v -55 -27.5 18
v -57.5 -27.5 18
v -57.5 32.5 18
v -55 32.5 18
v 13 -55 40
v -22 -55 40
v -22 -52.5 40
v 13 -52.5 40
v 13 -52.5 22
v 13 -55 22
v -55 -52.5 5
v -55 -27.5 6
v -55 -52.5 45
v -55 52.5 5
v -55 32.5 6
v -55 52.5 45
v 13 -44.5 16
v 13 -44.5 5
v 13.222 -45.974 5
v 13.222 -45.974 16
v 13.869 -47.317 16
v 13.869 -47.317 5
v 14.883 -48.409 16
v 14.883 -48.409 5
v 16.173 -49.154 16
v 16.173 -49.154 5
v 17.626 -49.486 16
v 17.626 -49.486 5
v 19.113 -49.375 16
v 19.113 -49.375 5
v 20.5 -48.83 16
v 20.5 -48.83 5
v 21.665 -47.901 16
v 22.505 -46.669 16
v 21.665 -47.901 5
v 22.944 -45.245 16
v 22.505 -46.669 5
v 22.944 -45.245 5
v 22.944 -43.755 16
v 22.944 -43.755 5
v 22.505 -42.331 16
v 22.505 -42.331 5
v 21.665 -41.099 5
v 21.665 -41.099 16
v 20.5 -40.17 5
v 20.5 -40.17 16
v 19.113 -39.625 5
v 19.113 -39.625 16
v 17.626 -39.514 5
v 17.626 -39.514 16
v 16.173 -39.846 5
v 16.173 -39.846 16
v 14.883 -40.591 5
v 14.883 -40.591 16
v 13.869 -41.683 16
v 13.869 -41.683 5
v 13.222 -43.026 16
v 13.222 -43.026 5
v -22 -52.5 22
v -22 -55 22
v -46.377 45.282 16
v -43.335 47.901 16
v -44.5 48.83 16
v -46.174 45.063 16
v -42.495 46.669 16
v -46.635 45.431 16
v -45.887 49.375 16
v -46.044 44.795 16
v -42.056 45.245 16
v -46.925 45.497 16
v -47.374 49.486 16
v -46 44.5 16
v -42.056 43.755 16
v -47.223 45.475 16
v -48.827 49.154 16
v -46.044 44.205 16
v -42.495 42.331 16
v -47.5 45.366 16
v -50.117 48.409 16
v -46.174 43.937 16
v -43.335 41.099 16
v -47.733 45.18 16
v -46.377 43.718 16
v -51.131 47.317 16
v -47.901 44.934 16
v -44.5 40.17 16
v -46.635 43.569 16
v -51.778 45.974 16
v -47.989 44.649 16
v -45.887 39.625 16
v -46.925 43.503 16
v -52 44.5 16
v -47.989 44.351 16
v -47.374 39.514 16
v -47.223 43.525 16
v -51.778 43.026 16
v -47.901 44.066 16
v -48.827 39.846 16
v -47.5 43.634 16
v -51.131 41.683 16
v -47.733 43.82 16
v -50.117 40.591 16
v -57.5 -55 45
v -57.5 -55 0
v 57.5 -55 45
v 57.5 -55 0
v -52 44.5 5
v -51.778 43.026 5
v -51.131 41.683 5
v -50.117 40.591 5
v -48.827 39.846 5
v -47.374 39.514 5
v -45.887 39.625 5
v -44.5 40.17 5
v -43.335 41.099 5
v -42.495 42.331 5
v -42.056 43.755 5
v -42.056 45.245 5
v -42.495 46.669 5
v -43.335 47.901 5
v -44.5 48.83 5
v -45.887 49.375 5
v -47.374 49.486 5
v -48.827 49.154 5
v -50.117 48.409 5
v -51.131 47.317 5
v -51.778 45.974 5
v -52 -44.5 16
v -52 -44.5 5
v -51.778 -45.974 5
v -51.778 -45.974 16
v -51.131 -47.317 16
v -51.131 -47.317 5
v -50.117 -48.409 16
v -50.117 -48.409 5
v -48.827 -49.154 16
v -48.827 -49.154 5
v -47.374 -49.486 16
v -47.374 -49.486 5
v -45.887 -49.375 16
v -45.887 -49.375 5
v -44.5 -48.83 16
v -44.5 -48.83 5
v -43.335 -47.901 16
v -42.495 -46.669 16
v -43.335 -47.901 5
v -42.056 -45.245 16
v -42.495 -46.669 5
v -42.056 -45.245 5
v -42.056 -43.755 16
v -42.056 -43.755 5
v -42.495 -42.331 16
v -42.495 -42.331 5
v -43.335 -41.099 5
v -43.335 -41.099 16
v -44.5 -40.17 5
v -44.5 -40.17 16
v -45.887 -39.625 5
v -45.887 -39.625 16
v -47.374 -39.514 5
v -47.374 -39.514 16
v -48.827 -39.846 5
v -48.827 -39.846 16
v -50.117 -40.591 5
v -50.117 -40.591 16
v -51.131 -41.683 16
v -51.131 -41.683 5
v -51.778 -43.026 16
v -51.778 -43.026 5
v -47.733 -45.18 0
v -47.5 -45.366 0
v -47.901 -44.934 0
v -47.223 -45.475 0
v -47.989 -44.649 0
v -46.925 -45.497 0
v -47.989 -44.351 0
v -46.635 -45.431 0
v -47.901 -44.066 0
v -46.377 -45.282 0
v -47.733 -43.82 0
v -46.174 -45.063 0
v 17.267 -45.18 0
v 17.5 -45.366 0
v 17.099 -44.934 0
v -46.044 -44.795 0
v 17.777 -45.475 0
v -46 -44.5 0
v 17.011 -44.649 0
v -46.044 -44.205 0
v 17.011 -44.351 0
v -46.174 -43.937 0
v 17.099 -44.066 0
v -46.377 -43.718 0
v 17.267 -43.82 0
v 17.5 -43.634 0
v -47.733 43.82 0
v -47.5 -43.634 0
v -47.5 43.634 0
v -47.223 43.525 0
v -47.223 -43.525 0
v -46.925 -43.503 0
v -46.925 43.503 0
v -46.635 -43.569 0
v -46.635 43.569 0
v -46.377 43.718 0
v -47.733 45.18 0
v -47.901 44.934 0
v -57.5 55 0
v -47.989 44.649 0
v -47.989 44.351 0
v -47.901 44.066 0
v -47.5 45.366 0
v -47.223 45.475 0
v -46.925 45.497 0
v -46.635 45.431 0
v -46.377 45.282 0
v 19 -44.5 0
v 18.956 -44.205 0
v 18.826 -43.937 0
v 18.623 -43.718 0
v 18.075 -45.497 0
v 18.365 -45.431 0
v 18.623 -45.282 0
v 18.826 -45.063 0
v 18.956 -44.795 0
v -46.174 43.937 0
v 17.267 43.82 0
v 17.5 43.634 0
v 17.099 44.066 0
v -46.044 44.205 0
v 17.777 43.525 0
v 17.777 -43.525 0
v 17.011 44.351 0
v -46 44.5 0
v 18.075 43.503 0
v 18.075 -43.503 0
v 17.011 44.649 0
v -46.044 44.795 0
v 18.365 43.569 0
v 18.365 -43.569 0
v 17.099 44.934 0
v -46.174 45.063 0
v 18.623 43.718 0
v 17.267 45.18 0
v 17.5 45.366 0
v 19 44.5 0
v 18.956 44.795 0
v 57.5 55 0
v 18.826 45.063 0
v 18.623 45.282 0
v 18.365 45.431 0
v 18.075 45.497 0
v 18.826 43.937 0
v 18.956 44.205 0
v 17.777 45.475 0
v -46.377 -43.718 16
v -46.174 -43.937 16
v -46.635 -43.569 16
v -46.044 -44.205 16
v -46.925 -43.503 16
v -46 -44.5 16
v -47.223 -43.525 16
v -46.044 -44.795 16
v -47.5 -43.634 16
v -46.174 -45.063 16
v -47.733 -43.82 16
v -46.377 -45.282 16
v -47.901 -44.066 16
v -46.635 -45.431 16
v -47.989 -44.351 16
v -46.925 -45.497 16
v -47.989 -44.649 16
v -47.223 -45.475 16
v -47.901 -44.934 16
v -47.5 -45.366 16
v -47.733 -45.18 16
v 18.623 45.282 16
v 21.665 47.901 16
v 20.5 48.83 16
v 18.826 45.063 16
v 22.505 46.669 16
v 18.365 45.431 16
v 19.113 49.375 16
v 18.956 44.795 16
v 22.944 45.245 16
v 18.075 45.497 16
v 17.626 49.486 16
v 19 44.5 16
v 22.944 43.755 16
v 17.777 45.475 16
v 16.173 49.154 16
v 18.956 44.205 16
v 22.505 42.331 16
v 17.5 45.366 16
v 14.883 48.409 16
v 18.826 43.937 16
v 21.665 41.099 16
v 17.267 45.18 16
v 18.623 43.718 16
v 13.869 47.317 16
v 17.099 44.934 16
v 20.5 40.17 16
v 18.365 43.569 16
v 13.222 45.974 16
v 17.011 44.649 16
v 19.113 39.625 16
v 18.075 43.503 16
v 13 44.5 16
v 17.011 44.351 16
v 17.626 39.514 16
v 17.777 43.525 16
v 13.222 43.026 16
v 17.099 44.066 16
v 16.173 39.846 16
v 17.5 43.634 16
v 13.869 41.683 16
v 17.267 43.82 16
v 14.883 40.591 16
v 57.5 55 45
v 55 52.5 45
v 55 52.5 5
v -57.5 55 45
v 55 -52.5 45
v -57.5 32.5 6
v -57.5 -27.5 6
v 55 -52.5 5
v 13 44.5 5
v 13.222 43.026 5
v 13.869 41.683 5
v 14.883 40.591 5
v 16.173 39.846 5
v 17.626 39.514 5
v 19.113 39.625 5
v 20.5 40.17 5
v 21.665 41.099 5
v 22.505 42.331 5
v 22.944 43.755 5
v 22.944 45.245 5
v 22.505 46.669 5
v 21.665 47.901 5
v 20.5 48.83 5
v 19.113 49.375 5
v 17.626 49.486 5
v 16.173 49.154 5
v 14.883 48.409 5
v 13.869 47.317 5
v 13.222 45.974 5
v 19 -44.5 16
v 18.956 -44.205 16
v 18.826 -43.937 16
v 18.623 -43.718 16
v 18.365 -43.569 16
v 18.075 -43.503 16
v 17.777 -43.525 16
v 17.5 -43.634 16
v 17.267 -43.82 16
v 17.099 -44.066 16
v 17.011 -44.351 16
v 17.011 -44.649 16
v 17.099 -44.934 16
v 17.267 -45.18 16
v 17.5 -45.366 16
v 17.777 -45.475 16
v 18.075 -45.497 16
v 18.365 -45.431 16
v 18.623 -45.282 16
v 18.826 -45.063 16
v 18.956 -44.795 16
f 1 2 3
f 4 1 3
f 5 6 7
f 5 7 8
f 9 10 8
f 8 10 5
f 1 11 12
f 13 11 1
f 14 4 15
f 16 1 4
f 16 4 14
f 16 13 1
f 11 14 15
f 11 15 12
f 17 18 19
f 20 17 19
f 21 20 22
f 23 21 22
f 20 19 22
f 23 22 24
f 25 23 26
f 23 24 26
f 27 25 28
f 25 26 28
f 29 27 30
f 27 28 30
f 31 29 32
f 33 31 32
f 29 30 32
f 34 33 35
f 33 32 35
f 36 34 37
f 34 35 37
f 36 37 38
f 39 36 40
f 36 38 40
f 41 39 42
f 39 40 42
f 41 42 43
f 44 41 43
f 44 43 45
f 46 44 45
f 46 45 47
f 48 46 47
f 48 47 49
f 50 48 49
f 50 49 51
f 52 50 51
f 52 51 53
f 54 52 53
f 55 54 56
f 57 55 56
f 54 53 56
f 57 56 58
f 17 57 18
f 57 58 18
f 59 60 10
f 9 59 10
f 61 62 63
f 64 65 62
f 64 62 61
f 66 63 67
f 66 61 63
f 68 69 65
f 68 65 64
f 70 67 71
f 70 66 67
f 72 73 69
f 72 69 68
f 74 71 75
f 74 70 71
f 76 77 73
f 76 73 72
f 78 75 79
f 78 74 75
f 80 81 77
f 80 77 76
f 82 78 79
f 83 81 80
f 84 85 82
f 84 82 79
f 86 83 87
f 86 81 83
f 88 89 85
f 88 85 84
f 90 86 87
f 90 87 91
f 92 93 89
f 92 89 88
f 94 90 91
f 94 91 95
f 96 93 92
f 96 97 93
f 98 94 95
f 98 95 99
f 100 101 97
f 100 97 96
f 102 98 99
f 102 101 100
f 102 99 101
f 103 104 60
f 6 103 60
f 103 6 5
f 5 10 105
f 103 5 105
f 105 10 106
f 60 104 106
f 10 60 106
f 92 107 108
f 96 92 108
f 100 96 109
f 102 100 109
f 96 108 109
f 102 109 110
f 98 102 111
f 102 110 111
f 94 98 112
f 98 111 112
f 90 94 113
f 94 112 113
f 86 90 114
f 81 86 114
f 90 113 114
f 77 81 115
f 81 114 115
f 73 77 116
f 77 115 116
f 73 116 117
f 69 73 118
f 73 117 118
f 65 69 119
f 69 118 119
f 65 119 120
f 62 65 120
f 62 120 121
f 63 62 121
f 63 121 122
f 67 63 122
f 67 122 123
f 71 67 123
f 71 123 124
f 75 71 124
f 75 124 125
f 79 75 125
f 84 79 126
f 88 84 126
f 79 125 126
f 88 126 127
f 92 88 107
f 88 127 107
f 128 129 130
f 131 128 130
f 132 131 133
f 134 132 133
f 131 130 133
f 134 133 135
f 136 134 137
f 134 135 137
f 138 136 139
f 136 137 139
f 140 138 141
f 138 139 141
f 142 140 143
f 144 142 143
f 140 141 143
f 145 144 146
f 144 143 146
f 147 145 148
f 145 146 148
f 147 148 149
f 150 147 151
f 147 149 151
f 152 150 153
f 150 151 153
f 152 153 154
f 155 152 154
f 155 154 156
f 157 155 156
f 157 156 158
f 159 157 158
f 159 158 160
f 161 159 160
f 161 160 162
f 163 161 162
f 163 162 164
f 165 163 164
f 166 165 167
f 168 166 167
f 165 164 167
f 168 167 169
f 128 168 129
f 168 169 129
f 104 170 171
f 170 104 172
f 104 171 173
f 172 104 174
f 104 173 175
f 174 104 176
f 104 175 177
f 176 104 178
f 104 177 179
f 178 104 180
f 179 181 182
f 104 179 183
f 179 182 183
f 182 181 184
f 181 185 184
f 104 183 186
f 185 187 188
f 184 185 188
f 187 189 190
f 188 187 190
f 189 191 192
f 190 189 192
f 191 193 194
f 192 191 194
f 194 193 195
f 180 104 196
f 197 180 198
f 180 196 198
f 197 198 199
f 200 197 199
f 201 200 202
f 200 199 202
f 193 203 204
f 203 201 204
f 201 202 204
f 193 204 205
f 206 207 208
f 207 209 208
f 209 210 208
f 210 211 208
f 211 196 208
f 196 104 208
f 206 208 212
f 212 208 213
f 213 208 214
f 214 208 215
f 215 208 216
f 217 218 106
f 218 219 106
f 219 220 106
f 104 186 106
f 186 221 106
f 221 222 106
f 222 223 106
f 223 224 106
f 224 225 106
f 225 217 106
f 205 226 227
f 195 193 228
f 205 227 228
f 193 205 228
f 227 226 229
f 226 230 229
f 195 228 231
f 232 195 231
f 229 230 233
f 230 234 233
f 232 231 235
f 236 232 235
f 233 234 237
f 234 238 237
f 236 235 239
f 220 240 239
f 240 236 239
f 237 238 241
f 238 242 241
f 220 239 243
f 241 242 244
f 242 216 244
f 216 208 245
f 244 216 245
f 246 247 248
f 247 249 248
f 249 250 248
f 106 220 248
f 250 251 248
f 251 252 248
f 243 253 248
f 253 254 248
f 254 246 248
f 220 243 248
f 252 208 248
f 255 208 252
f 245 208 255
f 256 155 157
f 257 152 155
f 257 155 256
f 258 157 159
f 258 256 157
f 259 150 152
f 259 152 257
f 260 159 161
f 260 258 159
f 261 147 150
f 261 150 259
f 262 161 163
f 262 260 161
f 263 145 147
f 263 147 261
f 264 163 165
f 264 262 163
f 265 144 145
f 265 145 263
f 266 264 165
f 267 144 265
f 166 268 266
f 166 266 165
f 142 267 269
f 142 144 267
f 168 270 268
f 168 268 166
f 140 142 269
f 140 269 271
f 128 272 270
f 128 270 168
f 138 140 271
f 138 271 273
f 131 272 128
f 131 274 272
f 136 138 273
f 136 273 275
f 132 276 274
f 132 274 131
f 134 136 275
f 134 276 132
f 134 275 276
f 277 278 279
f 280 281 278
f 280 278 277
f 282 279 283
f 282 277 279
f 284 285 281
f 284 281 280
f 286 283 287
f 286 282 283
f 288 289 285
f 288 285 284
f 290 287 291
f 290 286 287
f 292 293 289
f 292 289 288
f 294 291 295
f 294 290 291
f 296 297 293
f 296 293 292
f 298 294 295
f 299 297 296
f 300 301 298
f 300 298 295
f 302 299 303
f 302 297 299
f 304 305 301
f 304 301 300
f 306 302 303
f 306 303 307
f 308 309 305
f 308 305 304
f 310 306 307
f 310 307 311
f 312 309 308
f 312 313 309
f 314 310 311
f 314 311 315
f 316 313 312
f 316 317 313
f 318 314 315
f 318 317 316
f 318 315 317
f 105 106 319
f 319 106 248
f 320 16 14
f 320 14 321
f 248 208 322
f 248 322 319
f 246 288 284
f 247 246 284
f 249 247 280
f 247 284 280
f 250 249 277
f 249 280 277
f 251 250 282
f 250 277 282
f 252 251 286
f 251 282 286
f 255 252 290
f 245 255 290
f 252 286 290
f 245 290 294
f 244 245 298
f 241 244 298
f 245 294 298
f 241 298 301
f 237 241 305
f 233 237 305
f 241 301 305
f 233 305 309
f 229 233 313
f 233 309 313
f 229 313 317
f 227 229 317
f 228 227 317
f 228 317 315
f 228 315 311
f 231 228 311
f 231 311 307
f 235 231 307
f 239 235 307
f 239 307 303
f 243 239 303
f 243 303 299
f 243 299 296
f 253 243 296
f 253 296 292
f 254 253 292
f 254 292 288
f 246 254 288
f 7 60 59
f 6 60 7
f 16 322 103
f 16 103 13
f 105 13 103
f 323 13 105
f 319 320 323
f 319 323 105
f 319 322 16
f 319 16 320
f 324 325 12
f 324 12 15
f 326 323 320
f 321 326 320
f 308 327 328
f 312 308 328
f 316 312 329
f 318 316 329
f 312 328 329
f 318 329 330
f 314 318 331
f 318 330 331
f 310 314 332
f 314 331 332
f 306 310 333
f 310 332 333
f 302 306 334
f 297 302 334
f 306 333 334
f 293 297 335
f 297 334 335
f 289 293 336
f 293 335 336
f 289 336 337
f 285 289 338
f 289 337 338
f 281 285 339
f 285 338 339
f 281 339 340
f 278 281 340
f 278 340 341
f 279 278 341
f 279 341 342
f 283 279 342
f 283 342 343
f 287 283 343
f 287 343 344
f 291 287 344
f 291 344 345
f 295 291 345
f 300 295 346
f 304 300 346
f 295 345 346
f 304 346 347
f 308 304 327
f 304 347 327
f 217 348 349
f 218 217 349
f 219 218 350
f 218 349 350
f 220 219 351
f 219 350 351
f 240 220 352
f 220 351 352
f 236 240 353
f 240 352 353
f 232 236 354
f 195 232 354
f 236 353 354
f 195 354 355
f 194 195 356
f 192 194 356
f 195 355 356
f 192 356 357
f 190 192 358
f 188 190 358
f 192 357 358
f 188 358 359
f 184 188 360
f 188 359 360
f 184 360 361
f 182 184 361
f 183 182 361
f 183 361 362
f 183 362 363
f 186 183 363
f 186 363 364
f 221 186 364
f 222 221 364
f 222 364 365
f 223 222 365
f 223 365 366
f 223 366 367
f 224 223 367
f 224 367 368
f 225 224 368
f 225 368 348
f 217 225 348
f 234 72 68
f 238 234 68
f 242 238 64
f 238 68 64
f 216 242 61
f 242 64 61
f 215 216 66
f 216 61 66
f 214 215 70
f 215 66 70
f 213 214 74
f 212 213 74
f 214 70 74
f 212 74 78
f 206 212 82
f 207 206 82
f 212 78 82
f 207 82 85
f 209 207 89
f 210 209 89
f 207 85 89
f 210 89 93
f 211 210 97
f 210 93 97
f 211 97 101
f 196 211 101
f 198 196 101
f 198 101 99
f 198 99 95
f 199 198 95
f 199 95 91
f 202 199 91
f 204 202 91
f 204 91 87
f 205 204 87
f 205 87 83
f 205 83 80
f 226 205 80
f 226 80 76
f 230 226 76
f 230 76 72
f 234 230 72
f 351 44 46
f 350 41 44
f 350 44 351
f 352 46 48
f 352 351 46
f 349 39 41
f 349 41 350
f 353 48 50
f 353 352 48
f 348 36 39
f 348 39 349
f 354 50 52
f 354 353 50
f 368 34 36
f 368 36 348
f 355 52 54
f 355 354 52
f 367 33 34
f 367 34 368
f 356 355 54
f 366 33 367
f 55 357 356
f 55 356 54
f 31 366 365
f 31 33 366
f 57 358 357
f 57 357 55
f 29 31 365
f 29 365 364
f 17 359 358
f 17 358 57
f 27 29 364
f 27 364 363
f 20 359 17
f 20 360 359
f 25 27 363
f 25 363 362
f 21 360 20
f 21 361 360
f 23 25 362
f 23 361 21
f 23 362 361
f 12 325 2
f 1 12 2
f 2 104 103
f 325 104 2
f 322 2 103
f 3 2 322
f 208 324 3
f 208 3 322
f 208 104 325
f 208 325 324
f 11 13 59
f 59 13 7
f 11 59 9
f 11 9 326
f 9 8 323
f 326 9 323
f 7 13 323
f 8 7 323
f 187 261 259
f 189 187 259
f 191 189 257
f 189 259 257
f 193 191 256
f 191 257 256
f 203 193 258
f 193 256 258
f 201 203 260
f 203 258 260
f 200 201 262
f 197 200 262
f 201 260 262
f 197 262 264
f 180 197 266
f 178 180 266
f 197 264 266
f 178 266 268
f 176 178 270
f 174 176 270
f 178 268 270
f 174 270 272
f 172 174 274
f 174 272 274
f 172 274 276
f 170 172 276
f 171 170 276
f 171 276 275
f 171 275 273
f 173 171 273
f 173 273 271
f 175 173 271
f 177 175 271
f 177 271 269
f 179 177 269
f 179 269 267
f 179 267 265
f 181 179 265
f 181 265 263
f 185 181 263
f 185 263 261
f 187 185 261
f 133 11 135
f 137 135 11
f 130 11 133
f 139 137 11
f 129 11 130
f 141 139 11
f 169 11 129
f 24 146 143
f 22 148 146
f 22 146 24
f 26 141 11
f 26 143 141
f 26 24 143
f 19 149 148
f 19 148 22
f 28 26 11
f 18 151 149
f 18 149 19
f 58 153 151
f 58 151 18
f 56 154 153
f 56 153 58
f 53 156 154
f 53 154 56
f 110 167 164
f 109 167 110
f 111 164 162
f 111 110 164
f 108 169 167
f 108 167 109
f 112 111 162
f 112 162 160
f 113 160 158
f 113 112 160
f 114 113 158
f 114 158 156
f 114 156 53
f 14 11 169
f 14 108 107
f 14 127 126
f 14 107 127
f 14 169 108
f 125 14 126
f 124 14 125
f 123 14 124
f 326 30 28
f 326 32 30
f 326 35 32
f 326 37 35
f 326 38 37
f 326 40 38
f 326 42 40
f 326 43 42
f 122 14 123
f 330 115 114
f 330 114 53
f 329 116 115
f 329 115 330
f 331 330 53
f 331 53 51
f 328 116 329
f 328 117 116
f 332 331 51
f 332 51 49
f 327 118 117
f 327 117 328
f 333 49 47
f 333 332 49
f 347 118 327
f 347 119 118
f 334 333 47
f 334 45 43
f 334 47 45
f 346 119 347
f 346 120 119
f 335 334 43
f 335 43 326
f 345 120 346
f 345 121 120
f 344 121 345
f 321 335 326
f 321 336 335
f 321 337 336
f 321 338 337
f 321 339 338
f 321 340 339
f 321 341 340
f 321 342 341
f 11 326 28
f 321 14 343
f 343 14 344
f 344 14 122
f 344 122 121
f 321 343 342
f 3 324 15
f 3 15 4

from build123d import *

# Parameters (mm, degrees)
SKETCH1_W           = 115
SKETCH1_H           = 110
BOSS_EXTRUDE1_DEPTH = 45
SKETCH2_W           = 110
SKETCH2_H           = 105
CUT_EXTRUDE1_DEPTH  = 40
SKETCH10_R          = 5
BOSS_EXTRUDE4_DEPTH = 11
SKETCH11_R          = 1
CUT_EXTRUDE8_DEPTH  = 85.689137438
CUT_EXTRUDE9_REACH  = 134.027
SKETCH14_W          = 35
SKETCH14_H          = 18
SKETCH16_W          = 12
SKETCH16_H          = 60
CUT_EXTRUDE10_DEPTH = 5


with BuildPart() as part:
    # Sketch1 → Boss-Extrude1 (new body)
    with BuildSketch(Plane.XY):
        Rectangle(SKETCH1_W, SKETCH1_H)
    extrude(amount=BOSS_EXTRUDE1_DEPTH)

    # Sketch2 → Cut-Extrude1 (cut)
    with BuildSketch(Plane.XY.offset(45)):
        Rectangle(SKETCH2_W, SKETCH2_H)
    extrude(amount=-CUT_EXTRUDE1_DEPTH, mode=Mode.SUBTRACT)

    # Sketch10 → Boss-Extrude4 (add)
    with BuildSketch(Plane.XY.offset(5)):
        with Locations(Location((-47, -44.5, 0), (0, 0, 180))):
            Circle(SKETCH10_R)
        with Locations(Location((18, -44.5, 0), (0, 0, 180))):
            Circle(SKETCH10_R)
        with Locations(Location((-47, 44.5, 0), (0, 0, 180))):
            Circle(SKETCH10_R)
        with Locations(Location((18, 44.5, 0), (0, 0, 180))):
            Circle(SKETCH10_R)
    extrude(amount=BOSS_EXTRUDE4_DEPTH)

    # Sketch11 → Cut-Extrude8 (cut, through all)
    with BuildSketch(Plane.XY.offset(16)):
        with Locations((-47, 44.5)):
            Circle(SKETCH11_R)
        with Locations((18, 44.5)):
            Circle(SKETCH11_R)
        with Locations((18, -44.5)):
            Circle(SKETCH11_R)
        with Locations((-47, -44.5)):
            Circle(SKETCH11_R)
    extrude(amount=-CUT_EXTRUDE8_DEPTH, mode=Mode.SUBTRACT)

    # Sketch14 → Cut-Extrude9 (cut, up to next)
    with BuildSketch(Plane.XZ.offset(55), mode=Mode.PRIVATE) as cut_extrude9_sk1:
        with Locations((-4.5, 31)):
            Rectangle(SKETCH14_W, SKETCH14_H)
    cut_extrude9_tool1 = extrude(cut_extrude9_sk1.sketch, amount=-CUT_EXTRUDE9_REACH, mode=Mode.PRIVATE) & part.part
    add(cut_extrude9_tool1.solids().sort_by_distance((-4.5, -55, 31))[0], mode=Mode.SUBTRACT)

    # Sketch16 → Cut-Extrude10 (cut)
    with BuildSketch(Plane.ZY.offset(57.5)):
        with Locations((12, 2.5)):
            Rectangle(SKETCH16_W, SKETCH16_H)
    extrude(amount=-CUT_EXTRUDE10_DEPTH, mode=Mode.SUBTRACT)


solid = part.part
